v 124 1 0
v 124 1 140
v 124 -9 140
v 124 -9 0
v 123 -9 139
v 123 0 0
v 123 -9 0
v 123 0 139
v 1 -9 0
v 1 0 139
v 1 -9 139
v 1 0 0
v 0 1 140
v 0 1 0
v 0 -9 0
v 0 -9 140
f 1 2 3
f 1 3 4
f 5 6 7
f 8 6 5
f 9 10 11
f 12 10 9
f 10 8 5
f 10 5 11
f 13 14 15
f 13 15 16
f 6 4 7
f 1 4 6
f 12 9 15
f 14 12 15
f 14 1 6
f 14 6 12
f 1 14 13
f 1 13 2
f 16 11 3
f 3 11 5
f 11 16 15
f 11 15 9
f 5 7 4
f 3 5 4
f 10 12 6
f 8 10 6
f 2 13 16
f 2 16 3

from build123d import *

# Parameters (mm, degrees)
SZKIC1_W                    = 124
SZKIC1_H                    = 140
DODANIE_WYCI_GNI_CIE1_DEPTH = 1
DODANIE_WYCI_GNI_CIE2_DEPTH = 10


with BuildPart() as part:
    # Szkic1 → Dodanie-wyciągnięcie1 (new body)
    with BuildSketch(Plane(origin=(0, 0, 0), x_dir=(1, 0, 0), z_dir=(0, 1, 0))):
        with Locations((62, -70)):
            Rectangle(SZKIC1_W, SZKIC1_H)
    extrude(amount=DODANIE_WYCI_GNI_CIE1_DEPTH)

    # Szkic3 → Dodanie-wyciągnięcie2 (add)
    with BuildSketch(Plane(origin=(0, 1, 0), x_dir=(1, 0, 0), z_dir=(0, 1, 0))):
        Polygon((0, 0), (0, -140), (124, -140), (124, 0), (123, 0), (123, -139), (1, -139), (1, 0), align=None)
    extrude(amount=-DODANIE_WYCI_GNI_CIE2_DEPTH)


solid = part.part
